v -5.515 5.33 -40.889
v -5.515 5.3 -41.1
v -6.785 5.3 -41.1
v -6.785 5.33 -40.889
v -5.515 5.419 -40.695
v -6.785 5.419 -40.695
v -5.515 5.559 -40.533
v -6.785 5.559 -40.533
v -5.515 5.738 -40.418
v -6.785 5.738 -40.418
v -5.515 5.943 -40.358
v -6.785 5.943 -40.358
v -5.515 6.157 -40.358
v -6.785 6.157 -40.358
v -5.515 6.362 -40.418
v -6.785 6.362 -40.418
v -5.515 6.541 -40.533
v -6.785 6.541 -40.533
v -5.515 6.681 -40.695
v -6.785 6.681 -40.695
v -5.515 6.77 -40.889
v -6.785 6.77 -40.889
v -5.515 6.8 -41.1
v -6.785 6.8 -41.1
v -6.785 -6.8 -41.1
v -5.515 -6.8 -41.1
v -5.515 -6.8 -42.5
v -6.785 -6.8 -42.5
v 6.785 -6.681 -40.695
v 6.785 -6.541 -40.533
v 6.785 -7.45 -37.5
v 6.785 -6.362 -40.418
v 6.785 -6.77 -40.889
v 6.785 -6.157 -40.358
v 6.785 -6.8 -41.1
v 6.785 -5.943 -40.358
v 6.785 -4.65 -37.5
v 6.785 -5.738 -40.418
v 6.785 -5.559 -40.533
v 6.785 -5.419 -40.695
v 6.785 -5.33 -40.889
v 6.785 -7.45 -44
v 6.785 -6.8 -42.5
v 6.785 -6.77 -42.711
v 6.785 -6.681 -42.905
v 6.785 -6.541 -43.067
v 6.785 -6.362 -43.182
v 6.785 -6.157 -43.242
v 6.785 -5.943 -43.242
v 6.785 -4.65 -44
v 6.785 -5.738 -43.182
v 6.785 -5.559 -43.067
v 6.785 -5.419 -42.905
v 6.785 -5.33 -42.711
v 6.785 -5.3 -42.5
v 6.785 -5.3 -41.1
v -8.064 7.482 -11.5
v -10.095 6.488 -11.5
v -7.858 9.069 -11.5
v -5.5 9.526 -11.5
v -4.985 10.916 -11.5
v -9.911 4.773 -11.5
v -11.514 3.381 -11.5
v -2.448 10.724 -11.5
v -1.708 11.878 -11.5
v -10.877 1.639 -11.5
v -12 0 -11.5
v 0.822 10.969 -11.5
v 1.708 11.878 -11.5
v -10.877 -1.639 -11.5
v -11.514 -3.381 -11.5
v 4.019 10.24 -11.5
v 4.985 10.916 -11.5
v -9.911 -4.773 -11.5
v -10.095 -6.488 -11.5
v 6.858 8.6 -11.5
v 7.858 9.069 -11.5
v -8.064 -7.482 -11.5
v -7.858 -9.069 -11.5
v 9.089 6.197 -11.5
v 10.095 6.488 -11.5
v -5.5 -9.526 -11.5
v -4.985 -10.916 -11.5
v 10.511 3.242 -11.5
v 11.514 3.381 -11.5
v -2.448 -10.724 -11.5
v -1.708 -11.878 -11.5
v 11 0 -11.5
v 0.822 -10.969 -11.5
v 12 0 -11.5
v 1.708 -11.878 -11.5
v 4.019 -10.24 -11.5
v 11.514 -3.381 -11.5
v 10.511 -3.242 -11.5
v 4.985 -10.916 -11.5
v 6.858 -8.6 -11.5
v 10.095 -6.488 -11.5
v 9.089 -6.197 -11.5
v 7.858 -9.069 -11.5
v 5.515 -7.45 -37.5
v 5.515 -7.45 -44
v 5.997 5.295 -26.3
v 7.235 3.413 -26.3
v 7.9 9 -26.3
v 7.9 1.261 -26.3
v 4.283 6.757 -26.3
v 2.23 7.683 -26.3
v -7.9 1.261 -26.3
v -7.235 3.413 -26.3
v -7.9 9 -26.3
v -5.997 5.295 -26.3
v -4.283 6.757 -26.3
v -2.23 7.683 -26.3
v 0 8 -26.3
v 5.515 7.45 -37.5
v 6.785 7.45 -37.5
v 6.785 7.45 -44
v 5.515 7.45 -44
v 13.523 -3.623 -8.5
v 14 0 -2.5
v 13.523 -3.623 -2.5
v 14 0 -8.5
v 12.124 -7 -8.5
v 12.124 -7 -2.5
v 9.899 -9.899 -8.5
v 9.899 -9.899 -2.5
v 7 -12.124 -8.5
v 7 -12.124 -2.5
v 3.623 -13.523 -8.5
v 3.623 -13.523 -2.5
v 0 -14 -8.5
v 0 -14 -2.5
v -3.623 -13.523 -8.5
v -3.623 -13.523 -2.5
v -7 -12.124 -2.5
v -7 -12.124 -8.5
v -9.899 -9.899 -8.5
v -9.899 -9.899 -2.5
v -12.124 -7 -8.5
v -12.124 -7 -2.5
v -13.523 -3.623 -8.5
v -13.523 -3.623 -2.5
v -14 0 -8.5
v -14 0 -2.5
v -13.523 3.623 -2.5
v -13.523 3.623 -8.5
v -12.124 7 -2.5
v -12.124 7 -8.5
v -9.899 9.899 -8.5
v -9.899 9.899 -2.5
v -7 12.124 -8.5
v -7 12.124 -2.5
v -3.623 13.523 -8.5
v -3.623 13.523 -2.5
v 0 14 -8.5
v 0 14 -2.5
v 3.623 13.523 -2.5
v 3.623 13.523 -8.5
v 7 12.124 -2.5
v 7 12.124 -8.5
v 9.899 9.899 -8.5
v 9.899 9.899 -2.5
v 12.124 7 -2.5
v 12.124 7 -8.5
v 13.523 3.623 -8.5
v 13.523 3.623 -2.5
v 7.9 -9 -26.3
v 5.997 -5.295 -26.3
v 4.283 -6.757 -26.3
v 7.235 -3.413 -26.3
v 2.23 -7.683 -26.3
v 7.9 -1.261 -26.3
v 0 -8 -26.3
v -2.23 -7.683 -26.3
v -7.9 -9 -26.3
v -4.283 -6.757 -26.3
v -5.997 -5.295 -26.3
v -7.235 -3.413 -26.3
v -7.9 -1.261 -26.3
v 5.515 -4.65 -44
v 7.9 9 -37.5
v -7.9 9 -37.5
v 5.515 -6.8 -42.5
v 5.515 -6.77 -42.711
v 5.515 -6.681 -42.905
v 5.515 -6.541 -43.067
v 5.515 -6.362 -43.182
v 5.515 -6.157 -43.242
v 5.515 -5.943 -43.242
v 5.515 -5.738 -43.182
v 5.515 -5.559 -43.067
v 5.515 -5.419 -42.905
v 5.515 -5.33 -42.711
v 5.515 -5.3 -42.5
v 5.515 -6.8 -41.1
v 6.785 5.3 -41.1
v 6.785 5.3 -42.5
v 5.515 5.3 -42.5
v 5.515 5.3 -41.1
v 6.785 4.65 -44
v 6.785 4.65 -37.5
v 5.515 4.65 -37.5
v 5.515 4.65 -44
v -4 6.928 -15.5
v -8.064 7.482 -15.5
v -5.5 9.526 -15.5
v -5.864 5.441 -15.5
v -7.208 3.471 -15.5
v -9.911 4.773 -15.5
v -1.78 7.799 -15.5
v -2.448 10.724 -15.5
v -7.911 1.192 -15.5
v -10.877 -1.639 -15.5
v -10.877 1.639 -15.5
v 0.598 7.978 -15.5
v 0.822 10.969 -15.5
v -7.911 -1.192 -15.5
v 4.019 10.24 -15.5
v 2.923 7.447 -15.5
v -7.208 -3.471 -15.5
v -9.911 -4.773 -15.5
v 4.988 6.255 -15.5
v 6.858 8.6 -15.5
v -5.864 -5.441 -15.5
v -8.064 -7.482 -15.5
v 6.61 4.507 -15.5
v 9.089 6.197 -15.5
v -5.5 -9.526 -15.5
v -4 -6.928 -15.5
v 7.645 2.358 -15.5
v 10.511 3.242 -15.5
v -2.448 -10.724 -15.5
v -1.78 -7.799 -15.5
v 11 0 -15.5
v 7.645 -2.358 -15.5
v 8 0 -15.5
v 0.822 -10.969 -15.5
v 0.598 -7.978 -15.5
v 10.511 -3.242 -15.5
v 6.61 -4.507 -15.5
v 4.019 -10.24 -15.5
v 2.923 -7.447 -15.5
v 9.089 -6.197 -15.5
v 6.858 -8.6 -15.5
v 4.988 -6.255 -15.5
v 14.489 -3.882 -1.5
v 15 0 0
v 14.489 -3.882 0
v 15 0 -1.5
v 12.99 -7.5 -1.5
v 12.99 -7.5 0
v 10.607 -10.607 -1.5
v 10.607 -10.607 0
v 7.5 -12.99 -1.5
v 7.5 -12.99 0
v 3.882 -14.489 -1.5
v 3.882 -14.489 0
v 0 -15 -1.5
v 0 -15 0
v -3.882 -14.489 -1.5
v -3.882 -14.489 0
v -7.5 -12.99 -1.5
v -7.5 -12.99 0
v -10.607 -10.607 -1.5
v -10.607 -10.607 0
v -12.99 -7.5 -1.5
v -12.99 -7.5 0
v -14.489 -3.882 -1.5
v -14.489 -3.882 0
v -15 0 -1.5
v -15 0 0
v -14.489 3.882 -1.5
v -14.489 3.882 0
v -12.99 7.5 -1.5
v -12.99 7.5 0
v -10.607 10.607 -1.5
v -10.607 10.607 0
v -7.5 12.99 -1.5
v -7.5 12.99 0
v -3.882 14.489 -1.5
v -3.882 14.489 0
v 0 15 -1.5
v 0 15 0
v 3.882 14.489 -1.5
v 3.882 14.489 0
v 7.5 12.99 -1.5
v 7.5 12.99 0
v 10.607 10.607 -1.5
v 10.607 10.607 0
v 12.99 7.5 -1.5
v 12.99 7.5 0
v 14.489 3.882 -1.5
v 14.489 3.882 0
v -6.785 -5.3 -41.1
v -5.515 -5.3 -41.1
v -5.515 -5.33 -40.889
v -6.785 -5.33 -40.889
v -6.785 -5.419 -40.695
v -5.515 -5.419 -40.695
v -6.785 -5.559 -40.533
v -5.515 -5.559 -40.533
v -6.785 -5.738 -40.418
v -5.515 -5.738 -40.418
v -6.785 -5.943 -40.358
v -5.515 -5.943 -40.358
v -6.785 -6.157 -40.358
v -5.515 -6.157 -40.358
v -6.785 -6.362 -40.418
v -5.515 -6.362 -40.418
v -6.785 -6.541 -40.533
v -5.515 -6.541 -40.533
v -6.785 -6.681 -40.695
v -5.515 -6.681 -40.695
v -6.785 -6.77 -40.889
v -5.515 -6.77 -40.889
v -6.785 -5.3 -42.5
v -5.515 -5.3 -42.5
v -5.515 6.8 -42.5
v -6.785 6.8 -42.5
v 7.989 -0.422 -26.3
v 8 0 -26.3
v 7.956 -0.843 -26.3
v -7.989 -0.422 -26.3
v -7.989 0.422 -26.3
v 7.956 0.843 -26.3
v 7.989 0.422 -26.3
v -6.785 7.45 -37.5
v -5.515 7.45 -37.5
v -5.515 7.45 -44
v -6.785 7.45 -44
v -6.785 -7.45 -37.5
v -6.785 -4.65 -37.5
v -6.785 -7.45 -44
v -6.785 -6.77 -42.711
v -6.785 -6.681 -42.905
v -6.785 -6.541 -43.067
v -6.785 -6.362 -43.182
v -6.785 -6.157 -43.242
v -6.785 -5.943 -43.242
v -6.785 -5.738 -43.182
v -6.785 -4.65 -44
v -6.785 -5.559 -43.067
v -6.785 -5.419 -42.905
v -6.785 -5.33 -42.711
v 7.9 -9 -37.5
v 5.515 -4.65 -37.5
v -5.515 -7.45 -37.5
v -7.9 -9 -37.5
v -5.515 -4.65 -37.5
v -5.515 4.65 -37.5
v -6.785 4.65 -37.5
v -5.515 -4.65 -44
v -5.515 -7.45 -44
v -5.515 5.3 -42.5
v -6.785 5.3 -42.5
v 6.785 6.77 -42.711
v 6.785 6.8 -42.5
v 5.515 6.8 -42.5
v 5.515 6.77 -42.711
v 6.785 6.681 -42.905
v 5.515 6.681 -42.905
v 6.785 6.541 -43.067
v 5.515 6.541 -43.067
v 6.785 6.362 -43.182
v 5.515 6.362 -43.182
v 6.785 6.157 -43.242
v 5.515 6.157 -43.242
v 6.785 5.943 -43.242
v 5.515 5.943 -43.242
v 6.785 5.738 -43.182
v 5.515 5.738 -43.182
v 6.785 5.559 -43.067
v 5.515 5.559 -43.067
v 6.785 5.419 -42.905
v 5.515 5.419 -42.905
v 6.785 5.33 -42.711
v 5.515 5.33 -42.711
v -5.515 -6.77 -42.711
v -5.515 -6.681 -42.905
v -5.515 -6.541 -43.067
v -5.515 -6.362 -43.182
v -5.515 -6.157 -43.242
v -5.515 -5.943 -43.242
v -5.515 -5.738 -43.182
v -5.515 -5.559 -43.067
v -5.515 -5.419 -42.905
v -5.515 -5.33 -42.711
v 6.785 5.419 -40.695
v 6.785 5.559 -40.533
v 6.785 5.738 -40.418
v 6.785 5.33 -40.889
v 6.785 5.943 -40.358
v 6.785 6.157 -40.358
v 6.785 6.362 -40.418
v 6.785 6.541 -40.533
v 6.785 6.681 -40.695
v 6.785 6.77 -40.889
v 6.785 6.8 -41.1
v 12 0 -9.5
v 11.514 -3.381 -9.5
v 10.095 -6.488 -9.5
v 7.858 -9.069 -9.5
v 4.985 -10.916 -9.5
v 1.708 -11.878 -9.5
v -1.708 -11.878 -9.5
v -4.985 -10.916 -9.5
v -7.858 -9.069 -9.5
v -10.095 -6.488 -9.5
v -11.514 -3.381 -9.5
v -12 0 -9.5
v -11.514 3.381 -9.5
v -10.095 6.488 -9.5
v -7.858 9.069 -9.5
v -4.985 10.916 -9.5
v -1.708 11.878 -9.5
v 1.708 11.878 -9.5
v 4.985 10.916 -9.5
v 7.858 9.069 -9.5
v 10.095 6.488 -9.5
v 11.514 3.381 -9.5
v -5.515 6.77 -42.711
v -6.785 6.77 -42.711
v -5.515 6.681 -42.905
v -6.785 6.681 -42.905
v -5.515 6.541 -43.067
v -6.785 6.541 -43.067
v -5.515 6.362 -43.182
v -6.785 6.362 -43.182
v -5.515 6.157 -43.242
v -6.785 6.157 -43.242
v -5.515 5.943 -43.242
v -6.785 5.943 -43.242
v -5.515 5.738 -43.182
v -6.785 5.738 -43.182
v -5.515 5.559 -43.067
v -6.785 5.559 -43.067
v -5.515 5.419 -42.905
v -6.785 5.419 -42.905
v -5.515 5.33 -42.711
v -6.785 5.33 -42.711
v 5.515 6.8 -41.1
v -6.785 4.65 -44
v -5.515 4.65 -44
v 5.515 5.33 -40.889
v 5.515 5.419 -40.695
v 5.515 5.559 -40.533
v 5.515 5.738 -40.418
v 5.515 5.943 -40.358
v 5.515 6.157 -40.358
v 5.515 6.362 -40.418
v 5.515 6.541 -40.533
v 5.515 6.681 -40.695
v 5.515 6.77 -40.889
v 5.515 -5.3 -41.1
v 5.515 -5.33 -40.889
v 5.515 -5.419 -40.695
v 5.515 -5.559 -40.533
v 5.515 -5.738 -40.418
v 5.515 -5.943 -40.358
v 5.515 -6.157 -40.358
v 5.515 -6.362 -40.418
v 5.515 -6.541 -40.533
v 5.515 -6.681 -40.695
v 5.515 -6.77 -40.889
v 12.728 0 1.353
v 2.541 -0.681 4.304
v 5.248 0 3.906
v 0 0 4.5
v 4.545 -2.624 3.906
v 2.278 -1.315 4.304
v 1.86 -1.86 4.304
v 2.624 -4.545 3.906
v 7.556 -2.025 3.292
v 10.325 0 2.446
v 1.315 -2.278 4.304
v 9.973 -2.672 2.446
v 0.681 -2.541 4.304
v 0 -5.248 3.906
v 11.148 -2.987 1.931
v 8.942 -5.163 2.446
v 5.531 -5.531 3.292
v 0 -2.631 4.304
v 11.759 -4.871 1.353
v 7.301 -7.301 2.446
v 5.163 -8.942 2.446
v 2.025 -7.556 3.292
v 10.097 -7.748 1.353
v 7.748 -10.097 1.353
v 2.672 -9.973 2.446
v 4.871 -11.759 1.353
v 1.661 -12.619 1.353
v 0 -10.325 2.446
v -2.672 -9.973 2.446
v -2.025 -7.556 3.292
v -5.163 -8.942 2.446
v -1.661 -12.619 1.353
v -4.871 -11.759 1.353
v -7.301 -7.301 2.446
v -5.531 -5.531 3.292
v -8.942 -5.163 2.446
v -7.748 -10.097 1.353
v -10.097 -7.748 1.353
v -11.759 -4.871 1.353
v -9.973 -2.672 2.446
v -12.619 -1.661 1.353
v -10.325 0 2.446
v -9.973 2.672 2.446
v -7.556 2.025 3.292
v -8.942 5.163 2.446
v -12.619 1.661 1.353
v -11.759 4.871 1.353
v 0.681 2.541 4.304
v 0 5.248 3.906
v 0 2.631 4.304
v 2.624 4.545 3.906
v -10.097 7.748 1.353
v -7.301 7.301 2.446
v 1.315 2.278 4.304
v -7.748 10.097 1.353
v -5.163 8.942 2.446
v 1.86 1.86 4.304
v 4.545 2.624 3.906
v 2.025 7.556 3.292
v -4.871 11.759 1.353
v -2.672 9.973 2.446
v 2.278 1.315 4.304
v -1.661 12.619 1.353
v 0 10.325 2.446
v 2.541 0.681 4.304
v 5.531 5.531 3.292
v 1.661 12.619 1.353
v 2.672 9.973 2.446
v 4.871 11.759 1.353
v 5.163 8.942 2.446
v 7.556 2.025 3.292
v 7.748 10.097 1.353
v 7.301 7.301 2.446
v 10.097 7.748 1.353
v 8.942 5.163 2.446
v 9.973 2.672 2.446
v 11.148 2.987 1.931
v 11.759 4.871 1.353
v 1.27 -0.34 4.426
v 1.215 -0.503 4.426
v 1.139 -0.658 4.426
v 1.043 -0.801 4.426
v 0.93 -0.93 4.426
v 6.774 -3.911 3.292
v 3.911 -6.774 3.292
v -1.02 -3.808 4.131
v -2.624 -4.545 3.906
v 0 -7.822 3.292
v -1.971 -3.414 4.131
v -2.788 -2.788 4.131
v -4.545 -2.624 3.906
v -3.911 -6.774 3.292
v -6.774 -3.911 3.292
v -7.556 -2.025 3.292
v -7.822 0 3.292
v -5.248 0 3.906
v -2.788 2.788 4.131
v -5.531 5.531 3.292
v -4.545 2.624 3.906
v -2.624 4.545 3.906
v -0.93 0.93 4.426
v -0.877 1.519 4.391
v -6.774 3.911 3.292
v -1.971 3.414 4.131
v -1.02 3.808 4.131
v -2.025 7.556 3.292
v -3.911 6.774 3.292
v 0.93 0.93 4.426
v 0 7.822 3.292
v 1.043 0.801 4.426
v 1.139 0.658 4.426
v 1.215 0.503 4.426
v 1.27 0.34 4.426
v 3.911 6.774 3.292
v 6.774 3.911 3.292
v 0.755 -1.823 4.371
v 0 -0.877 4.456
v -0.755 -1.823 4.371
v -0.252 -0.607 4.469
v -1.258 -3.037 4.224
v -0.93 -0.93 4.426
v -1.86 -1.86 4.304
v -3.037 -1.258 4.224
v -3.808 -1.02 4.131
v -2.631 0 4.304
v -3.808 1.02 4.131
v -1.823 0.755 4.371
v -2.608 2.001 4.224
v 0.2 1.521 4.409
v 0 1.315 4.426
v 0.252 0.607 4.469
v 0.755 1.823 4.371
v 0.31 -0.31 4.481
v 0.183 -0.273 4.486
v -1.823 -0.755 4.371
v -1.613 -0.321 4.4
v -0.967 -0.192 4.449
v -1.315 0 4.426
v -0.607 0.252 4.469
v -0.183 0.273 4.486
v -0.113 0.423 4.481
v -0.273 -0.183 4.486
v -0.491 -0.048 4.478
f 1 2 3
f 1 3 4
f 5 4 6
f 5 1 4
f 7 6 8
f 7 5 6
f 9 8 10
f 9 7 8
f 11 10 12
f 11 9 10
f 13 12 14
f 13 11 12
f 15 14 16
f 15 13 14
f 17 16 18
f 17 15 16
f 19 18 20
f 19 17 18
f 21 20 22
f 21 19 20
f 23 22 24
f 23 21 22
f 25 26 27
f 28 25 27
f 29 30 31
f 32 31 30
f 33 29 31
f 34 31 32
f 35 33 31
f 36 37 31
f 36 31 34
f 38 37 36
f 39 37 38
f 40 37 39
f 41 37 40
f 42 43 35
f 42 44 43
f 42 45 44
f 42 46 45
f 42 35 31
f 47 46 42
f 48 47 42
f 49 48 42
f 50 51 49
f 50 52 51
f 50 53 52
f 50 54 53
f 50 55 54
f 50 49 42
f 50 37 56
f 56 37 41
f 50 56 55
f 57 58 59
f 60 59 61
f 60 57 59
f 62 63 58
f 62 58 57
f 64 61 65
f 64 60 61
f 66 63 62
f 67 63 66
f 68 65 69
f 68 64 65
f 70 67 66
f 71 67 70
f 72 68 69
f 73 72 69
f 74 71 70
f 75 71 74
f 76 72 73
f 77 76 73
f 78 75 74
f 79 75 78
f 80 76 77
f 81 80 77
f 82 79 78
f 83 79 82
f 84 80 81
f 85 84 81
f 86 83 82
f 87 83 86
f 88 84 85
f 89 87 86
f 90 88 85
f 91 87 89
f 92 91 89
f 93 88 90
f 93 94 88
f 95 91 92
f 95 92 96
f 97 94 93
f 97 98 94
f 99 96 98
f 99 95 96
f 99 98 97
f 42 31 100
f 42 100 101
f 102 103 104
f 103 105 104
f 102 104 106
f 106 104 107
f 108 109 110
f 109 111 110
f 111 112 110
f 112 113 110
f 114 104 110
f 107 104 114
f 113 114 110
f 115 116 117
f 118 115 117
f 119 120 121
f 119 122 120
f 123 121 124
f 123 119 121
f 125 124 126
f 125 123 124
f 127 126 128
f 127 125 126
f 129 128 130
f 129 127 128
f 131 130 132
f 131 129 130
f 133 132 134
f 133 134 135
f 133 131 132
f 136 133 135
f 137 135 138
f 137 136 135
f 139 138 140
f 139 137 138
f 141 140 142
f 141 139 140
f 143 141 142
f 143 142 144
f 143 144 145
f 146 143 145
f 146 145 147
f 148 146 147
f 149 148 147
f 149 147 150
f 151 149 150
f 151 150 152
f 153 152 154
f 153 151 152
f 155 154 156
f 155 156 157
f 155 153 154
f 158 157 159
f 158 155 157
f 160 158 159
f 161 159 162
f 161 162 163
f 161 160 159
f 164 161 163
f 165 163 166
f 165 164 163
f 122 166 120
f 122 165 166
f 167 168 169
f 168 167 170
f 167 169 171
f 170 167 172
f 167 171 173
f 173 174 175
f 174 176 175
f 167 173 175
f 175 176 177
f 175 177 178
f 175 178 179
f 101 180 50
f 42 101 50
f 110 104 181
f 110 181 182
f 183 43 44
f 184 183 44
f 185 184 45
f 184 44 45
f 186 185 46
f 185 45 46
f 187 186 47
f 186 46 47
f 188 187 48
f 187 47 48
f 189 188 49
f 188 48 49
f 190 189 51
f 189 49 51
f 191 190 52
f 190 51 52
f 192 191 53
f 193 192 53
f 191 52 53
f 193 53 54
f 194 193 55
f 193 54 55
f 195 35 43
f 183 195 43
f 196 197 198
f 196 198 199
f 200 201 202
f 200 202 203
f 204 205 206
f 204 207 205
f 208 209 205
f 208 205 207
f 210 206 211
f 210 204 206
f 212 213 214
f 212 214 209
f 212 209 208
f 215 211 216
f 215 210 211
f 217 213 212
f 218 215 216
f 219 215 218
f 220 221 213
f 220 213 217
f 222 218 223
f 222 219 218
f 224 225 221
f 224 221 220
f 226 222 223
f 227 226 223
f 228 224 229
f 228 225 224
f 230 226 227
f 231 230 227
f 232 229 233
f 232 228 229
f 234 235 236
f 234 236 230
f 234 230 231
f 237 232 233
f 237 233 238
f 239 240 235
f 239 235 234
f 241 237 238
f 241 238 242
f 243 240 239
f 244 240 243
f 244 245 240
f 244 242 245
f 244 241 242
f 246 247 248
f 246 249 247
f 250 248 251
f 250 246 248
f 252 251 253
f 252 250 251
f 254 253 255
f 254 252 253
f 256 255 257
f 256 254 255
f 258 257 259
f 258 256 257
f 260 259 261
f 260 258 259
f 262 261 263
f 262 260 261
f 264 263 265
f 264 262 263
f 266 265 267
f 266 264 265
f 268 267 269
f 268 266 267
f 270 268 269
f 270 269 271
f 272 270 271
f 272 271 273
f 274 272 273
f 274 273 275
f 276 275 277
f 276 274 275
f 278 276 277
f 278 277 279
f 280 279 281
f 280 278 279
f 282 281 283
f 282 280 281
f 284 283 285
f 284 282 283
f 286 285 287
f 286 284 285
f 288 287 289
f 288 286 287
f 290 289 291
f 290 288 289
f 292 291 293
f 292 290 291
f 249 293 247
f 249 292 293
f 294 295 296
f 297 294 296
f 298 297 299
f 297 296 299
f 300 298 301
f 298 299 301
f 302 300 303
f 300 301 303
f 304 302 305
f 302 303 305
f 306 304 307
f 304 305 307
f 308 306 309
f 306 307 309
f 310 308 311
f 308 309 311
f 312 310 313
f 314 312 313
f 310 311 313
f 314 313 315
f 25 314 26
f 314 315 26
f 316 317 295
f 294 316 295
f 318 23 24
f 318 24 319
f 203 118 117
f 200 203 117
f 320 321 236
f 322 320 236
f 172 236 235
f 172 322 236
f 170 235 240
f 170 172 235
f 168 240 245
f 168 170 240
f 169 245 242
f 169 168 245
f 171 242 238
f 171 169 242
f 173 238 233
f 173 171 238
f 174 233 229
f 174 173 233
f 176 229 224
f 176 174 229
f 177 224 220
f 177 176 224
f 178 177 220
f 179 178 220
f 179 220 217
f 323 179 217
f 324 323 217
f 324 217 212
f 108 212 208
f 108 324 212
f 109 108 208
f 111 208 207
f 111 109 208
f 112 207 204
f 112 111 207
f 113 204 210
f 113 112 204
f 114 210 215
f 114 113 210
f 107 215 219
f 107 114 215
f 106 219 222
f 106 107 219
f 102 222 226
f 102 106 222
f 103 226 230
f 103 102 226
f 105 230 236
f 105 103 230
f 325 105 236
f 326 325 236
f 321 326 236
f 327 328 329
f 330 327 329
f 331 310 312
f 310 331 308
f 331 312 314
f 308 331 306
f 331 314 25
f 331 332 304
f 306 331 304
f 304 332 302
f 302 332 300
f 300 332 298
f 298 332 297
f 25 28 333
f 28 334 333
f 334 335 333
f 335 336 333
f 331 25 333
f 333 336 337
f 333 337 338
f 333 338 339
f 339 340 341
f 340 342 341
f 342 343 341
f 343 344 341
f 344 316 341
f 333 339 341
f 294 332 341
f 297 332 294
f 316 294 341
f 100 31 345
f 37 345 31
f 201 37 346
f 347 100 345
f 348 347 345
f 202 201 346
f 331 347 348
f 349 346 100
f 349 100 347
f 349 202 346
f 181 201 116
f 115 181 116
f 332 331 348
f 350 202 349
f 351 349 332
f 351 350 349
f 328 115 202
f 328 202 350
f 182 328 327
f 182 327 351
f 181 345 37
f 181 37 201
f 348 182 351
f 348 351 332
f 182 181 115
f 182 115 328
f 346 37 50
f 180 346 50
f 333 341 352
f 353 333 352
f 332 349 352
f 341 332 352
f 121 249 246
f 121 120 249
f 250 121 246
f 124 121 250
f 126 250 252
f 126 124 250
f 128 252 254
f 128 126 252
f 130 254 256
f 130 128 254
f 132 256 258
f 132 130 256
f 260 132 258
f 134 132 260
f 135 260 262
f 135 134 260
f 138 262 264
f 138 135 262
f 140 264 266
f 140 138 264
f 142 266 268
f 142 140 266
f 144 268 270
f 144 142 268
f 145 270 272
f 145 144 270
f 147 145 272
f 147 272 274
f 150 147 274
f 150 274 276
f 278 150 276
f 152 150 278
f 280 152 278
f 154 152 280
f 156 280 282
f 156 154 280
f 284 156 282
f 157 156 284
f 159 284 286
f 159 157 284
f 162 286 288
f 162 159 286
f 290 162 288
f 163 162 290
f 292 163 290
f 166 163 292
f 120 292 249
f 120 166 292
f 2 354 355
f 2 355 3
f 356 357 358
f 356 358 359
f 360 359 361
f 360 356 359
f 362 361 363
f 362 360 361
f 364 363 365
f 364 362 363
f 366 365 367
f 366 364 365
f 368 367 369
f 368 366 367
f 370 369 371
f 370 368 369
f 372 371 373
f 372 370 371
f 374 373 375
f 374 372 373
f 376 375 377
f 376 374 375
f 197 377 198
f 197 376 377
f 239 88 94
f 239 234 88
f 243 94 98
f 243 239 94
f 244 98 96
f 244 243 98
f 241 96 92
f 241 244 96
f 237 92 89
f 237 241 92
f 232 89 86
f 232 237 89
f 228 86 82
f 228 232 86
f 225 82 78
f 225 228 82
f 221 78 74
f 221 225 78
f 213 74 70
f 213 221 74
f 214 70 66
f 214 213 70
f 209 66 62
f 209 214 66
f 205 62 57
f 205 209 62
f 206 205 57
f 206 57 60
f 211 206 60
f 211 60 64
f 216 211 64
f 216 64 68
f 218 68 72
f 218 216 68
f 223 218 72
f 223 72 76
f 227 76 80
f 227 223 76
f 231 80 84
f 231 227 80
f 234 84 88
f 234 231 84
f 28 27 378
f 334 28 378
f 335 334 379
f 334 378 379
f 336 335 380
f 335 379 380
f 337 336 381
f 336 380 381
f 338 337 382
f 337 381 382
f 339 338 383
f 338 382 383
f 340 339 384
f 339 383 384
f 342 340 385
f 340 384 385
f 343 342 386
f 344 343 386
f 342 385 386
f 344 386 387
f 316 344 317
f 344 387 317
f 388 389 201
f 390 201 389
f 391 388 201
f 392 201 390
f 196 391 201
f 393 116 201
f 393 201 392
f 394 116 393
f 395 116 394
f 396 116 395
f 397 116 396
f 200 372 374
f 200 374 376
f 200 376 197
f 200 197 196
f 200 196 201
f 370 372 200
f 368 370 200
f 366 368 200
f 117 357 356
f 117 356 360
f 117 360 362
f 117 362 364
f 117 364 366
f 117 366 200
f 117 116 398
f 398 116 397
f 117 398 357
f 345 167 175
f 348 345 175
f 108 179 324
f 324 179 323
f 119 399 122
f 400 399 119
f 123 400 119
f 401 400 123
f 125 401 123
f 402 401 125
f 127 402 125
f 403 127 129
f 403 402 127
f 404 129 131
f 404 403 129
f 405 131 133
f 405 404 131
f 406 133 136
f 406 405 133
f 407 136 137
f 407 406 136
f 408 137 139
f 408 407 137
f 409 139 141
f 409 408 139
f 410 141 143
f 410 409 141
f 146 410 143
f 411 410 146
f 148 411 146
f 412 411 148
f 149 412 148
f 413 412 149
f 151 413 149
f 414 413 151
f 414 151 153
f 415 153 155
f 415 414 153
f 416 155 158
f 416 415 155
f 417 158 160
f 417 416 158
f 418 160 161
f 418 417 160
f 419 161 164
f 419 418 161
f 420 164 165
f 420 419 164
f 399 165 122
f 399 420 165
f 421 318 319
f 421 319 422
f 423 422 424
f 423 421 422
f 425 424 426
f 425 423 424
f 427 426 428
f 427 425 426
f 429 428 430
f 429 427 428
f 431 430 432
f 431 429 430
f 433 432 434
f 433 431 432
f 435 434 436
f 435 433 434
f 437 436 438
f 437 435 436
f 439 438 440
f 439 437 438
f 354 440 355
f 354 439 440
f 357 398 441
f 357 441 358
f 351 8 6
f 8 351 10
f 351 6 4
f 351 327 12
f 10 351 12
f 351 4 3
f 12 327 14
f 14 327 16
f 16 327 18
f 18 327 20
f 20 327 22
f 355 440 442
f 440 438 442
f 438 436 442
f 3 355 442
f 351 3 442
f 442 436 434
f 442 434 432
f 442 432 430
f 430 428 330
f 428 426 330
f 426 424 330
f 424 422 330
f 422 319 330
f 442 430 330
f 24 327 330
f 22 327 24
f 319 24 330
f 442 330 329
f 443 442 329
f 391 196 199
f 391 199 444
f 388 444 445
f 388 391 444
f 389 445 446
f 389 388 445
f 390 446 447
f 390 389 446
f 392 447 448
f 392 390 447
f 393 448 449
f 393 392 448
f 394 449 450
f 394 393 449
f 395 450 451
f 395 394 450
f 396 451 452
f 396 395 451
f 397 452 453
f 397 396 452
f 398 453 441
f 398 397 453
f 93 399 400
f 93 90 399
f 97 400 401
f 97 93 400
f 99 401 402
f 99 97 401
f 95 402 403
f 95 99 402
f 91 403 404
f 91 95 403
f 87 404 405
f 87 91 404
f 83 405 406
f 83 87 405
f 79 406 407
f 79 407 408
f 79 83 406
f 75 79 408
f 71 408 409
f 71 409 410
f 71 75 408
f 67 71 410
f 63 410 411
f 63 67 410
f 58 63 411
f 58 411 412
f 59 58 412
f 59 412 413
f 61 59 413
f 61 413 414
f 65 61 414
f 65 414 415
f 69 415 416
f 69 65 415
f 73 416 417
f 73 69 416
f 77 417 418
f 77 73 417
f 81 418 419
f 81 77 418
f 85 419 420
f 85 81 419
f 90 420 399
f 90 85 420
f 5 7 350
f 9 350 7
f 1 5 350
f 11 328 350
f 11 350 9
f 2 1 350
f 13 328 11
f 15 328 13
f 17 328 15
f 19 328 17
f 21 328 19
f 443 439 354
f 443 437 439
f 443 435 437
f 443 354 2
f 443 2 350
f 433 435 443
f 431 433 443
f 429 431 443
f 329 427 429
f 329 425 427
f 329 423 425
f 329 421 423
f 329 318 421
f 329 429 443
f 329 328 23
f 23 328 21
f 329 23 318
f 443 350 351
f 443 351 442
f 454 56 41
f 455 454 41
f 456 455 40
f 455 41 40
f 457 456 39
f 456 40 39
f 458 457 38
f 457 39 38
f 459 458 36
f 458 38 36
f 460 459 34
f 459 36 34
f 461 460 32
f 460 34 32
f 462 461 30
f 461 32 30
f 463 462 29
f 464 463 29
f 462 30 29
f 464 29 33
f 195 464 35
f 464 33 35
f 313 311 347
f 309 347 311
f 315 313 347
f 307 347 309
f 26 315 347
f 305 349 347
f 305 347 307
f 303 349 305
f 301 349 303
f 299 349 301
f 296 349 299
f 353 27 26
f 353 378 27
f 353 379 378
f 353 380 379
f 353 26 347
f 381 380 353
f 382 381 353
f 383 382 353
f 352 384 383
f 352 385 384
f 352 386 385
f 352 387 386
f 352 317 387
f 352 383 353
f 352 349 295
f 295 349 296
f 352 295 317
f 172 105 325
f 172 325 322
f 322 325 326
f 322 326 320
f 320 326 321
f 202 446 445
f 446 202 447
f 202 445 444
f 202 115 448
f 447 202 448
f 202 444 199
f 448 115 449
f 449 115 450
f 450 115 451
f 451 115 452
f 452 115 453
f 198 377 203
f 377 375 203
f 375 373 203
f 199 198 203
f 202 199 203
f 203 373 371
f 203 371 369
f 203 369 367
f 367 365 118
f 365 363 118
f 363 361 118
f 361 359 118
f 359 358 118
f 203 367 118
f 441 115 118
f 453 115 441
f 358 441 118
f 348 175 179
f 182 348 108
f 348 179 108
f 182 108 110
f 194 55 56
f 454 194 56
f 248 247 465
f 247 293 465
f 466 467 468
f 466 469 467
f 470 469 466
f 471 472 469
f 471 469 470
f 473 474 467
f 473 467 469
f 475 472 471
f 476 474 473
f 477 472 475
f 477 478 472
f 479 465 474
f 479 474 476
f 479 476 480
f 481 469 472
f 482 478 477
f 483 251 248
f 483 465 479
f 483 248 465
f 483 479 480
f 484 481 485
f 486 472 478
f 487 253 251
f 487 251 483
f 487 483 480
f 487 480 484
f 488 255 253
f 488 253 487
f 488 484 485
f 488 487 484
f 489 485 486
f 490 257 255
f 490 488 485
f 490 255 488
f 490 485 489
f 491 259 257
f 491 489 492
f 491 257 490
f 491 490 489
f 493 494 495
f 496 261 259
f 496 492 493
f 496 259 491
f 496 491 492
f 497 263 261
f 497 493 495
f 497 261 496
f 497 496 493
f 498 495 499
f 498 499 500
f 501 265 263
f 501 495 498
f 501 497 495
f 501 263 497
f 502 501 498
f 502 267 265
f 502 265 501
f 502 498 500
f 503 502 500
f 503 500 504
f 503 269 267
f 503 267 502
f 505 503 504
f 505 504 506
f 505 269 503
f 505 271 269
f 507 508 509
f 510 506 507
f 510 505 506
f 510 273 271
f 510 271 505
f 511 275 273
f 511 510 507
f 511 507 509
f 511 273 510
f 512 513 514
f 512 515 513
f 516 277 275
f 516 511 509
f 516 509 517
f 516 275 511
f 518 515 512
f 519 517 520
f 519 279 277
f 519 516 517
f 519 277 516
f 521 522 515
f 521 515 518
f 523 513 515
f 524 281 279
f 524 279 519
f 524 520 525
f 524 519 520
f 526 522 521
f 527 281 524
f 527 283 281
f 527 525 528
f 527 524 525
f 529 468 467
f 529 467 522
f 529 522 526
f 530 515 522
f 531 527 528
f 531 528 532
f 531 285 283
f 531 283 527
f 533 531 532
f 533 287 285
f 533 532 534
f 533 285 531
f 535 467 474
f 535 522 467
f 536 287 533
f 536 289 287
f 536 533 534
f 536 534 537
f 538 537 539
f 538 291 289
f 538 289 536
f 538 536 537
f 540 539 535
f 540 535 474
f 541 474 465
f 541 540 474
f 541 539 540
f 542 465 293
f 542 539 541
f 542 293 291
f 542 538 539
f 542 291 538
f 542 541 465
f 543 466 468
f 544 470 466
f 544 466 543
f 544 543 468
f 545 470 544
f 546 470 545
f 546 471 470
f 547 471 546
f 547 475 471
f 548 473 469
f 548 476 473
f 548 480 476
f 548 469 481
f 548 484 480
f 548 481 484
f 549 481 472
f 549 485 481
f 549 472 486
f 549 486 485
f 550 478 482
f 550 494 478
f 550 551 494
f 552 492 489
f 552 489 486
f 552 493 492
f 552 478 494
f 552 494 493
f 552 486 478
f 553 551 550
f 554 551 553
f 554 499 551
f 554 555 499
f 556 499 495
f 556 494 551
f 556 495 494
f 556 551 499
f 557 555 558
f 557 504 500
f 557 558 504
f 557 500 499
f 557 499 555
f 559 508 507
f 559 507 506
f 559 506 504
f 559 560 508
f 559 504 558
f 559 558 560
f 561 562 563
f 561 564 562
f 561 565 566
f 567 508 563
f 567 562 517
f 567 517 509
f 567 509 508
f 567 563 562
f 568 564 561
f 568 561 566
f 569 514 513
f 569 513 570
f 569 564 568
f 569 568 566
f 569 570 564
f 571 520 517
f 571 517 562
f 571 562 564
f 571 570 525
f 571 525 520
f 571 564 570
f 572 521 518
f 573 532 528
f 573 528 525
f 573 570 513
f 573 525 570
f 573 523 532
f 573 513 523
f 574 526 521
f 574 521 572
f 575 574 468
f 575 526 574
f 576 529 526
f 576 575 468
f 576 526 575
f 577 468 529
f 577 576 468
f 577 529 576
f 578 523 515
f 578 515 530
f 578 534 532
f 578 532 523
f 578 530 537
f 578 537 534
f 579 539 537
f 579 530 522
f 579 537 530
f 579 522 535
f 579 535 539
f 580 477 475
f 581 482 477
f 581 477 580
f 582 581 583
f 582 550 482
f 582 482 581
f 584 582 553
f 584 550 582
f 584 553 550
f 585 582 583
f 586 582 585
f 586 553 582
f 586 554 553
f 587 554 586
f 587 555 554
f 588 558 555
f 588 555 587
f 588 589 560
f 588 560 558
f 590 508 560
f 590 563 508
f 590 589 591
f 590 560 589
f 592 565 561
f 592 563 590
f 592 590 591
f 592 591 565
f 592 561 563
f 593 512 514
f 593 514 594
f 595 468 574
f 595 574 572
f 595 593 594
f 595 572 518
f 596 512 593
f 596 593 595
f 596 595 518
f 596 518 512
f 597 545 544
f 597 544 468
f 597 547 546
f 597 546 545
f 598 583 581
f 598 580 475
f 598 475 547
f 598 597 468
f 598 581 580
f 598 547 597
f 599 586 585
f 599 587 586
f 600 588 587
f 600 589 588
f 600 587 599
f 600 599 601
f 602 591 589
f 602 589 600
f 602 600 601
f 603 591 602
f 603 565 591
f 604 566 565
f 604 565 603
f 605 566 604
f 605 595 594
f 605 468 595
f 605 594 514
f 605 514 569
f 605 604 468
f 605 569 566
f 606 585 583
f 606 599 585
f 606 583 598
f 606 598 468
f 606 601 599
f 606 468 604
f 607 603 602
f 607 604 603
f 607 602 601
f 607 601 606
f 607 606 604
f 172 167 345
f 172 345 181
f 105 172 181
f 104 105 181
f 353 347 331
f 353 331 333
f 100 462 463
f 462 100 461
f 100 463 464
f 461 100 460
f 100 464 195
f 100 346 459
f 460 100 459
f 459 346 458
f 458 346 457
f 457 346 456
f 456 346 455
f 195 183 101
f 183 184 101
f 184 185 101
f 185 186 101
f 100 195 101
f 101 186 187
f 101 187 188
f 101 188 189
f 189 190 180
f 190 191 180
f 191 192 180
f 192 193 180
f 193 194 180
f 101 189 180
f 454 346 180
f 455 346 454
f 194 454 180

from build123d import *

# Parameters (mm, degrees)
SKETCH2_W           = 15.8
SKETCH2_H           = 18
BOSS_EXTRUDE2_DEPTH = 11.2
SKETCH3_W           = 1.27
SKETCH3_H           = 6.5
BOSS_EXTRUDE3_DEPTH = 18
SKETCH4_W           = 6.5
SKETCH4_H           = 1.55
SKETCH4_H_2         = 9.3
CUT_EXTRUDE1_DEPTH  = 52.337960929
CUT_EXTRUDE2_DEPTH  = 52.337960929


with BuildPart() as part:
    # Sketch1 → Revolve1 (revolve)
    with BuildSketch(Plane(origin=(0, 0, 0), x_dir=(0, 0, -1), z_dir=(1, 0, 0)), mode=Mode.PRIVATE) as revolve1_sk:
        with BuildLine():
            Line((0, 15), (1.5, 15))
            Line((1.5, 15), (2.5, 14))
            Line((2.5, 14), (8.5, 14))
            Line((8.5, 14), (9.5, 12))
            Line((9.5, 12), (11.5, 12))
            Line((11.5, 12), (11.5, 11))
            Line((11.5, 11), (15.5, 11))
            Line((15.5, 11), (15.5, 8))
            Line((15.5, 8), (26.3, 8))
            Line((26.3, 8), (26.3, 0))
            Line((26.3, 0), (-4.5, 0))
            add(Edge.make_bspline(
                [(-4.5, 0), (-4.300353952, 5.255228693), (-2.977309479, 10.604163614), (0, 15)],
                knots=[0, 0, 0, 0, 1, 1, 1, 1], degree=3))
        make_face()
    revolve(revolve1_sk.sketch.rotate(Axis((0, 0, 0), (0, 0, -1)), 90), axis=Axis((0, 0, 0), (0, 0, -1)))

    # Sketch2 → Boss-Extrude2 (add)
    with BuildSketch(Plane(origin=(0, 0, -26.3), x_dir=(-1, 0, 0), z_dir=(0, 0, -1))):
        Rectangle(SKETCH2_W, SKETCH2_H)
    extrude(amount=BOSS_EXTRUDE2_DEPTH)

    # Sketch3 → Boss-Extrude3 (add)
    with BuildSketch(Plane(origin=(0, 9, 0), x_dir=(1, 0, 0), z_dir=(0, 1, 0))):
        with Locations((-6.15, 40.75)):
            Rectangle(SKETCH3_W, SKETCH3_H)
        with Locations((6.15, 40.75)):
            Rectangle(SKETCH3_W, SKETCH3_H)
    extrude(amount=-BOSS_EXTRUDE3_DEPTH)

    # Sketch4 → Cut-Extrude1 (cut, through all)
    with BuildSketch(Plane(origin=(6.785, 0, 0), x_dir=(0, 0, -1), z_dir=(1, 0, 0))):
        with Locations((40.75, 8.225)):
            Rectangle(SKETCH4_W, SKETCH4_H)
        with Locations((40.75, 0)):
            Rectangle(SKETCH4_W, SKETCH4_H_2)
        with Locations((40.75, -8.225)):
            Rectangle(SKETCH4_W, SKETCH4_H)
    extrude(amount=-CUT_EXTRUDE1_DEPTH, mode=Mode.SUBTRACT)

    # Sketch5 → Cut-Extrude2 (cut, through all)
    with BuildSketch(Plane(origin=(6.785, 0, 0), x_dir=(0, 0, -1), z_dir=(1, 0, 0))):
        with BuildLine():
            Line((41.1, 6.8), (42.5, 6.8))
            ThreePointArc((42.5, 6.8), (43.25, 6.05), (42.5, 5.3))
            Line((42.5, 5.3), (41.1, 5.3))
            ThreePointArc((41.1, 5.3), (40.35, 6.05), (41.1, 6.8))
        make_face()
    cut_extrude2 = extrude(amount=-CUT_EXTRUDE2_DEPTH, mode=Mode.SUBTRACT)

    # Mirror1: Cut-Extrude2 across plane
    add(cut_extrude2.mirror(Plane.ZX), mode=Mode.SUBTRACT)


solid = part.part
